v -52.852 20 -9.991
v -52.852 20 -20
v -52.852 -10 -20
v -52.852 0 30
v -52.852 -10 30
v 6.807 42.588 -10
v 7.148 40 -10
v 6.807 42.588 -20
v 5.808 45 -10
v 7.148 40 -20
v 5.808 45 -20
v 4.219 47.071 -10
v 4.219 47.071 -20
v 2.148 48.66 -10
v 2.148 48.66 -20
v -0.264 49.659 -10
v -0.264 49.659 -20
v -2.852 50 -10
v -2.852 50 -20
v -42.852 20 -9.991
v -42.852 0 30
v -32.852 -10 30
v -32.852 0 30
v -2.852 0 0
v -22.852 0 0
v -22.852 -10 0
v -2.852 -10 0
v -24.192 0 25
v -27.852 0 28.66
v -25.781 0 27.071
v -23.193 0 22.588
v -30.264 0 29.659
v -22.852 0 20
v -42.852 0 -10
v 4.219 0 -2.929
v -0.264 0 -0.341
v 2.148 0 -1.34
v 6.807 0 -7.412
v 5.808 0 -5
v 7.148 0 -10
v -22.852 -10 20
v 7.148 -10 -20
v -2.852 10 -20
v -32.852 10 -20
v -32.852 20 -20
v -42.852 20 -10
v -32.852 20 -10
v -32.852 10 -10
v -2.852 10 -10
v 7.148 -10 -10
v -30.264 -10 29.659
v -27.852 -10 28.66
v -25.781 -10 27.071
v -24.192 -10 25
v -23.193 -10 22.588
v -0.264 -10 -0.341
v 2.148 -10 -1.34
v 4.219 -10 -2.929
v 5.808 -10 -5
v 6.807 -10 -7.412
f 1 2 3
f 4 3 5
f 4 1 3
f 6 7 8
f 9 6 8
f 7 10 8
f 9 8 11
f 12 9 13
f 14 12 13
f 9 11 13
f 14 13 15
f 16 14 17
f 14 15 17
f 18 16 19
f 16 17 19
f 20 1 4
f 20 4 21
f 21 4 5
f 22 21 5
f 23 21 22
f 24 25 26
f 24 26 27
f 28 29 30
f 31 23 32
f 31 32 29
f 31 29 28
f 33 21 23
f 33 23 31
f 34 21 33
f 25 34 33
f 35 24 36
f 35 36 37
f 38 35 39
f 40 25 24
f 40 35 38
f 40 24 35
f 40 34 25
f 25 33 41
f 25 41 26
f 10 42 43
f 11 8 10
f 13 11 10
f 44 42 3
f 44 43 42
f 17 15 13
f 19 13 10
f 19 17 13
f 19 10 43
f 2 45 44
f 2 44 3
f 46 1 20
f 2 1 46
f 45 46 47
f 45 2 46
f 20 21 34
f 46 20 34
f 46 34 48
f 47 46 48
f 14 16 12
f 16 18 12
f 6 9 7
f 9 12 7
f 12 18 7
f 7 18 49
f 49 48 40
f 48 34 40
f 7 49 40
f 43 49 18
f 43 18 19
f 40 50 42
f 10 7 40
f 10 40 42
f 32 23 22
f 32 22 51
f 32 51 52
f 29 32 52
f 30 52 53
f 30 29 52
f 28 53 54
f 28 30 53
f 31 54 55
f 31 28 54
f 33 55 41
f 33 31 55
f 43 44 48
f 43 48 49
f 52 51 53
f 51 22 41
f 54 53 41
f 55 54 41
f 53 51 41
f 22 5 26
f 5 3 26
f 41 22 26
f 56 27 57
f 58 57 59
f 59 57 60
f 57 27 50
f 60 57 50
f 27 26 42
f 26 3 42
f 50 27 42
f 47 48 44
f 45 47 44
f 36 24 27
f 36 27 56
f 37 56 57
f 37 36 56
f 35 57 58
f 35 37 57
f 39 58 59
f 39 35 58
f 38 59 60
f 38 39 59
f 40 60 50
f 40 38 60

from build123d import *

# Parameters (mm, degrees)
SKETCH1_W           = 10
SKETCH1_H           = 10
BOSS_EXTRUDE1_DEPTH = 20
SKETCH1_3_W         = 10
SKETCH1_3_H         = 10
BOSS_EXTRUDE2_DEPTH = 20
SKETCH1_4_W         = 10
SKETCH1_4_H         = 40
BOSS_EXTRUDE3_DEPTH = 20
SKETCH1_5_W         = 10
SKETCH1_5_H         = 10
BOSS_EXTRUDE4_DEPTH = 50
SKETCH1_6_W         = 30
SKETCH1_6_H         = 10
BOSS_EXTRUDE5_DEPTH = 10
CHAMFER1_SIZE2      = 39.991364166
CHAMFER1_SIZE       = 20
FILLET1_R           = 10
SKETCH1_7_W         = 10
SKETCH1_7_H         = 40
SKETCH1_7_H_2       = 10
SKETCH1_7_W_2       = 30
BOSS_EXTRUDE6_DEPTH = 10


with BuildPart() as part:
    # Sketch1 → Boss-Extrude1 (new body)
    with BuildSketch(Plane(origin=(0, 0, 0), x_dir=(1, 0, 0), z_dir=(0, 1, 0))):
        with Locations((-47.852369013, 15)):
            Rectangle(SKETCH1_W, SKETCH1_H)
    extrude(amount=BOSS_EXTRUDE1_DEPTH)

    # Sketch1<3> → Boss-Extrude2 (add)
    with BuildSketch(Plane(origin=(0, 0, 0), x_dir=(1, 0, 0), z_dir=(0, 1, 0))):
        with Locations((-37.852369013, 15)):
            Rectangle(SKETCH1_3_W, SKETCH1_3_H)
    extrude(amount=BOSS_EXTRUDE2_DEPTH)

    # Sketch1<4> → Boss-Extrude3 (add)
    with BuildSketch(Plane(origin=(0, 0, 0), x_dir=(1, 0, 0), z_dir=(0, 1, 0))):
        with Locations((-47.852369013, -10)):
            Rectangle(SKETCH1_4_W, SKETCH1_4_H)
    extrude(amount=BOSS_EXTRUDE3_DEPTH)



with BuildPart() as body_2:
    # Sketch1<5> → Boss-Extrude4 (new body)
    with BuildSketch(Plane(origin=(0, 0, 0), x_dir=(1, 0, 0), z_dir=(0, 1, 0))):
        with Locations((2.147630987, 15)):
            Rectangle(SKETCH1_5_W, SKETCH1_5_H)
    extrude(amount=BOSS_EXTRUDE4_DEPTH)


with BuildPart() as part_1:
    add(part.part)

    add(body_2.part)  # Boss-Extrude5 merges body 2
    # Sketch1<6> → Boss-Extrude5 (add)
    with BuildSketch(Plane(origin=(0, 0, 0), x_dir=(1, 0, 0), z_dir=(0, 1, 0))):
        with Locations((-17.852369013, 15)):
            Rectangle(SKETCH1_6_W, SKETCH1_6_H)
    extrude(amount=BOSS_EXTRUDE5_DEPTH)

    # Chamfer1
    chamfer1_edges = [part_1.edges().sort_by_distance(p)[0] for p in [
        (-47.852369013, 20, 30),
    ]]
    chamfer1_side = [part_1.faces().sort_by_distance(p)[0] for p in [
        (-47.852369013, 19.6, 30),
    ]]
    chamfer(chamfer1_edges, length=CHAMFER1_SIZE - 0.0001, length2=CHAMFER1_SIZE2 - 0.0001, reference=chamfer1_side[0])  # a hair under: the kernel refuses the full size

    # Fillet1
    fillet1_edges = [part_1.edges().sort_by_distance(p)[0] for p in [
        (7.147630987, 50, -15),
    ]]
    fillet(fillet1_edges, radius=FILLET1_R - 0.0001)  # a hair under: the kernel refuses the full size

    # Sketch1<7> → Boss-Extrude6 (add)
    with BuildSketch(Plane(origin=(0, 0, 0), x_dir=(1, 0, 0), z_dir=(0, 1, 0))):
        with Locations((-47.852369013, -10)):
            Rectangle(SKETCH1_7_W, SKETCH1_7_H)
        with BuildLine():
            Line((-42.852369013, 10), (-42.852369013, -30))
            Line((-42.852369013, -30), (-32.852369013, -30))
            ThreePointArc((-32.852369013, -30), (-25.781301201, -27.071067812), (-22.852369013, -20))
            Line((-22.852369013, -20), (-22.852369013, 0))
            Line((-22.852369013, 0), (-2.852369013, 0))
            ThreePointArc((-2.852369013, 0), (4.218698799, 2.928932188), (7.147630987, 10))
            Line((7.147630987, 10), (-2.852369013, 10))
            Line((-2.852369013, 10), (-32.852369013, 10))
            Line((-32.852369013, 10), (-42.852369013, 10))
        make_face()
        with Locations((-47.852369013, 15)):
            Rectangle(SKETCH1_7_W, SKETCH1_7_H_2)
        with Locations((-37.852369013, 15)):
            Rectangle(SKETCH1_7_W, SKETCH1_7_H_2)
        with Locations((-17.852369013, 15)):
            Rectangle(SKETCH1_7_W_2, SKETCH1_7_H_2)
        with Locations((2.147630987, 15)):
            Rectangle(SKETCH1_7_W, SKETCH1_7_H_2)
    extrude(amount=-BOSS_EXTRUDE6_DEPTH)


solid = part_1.part
